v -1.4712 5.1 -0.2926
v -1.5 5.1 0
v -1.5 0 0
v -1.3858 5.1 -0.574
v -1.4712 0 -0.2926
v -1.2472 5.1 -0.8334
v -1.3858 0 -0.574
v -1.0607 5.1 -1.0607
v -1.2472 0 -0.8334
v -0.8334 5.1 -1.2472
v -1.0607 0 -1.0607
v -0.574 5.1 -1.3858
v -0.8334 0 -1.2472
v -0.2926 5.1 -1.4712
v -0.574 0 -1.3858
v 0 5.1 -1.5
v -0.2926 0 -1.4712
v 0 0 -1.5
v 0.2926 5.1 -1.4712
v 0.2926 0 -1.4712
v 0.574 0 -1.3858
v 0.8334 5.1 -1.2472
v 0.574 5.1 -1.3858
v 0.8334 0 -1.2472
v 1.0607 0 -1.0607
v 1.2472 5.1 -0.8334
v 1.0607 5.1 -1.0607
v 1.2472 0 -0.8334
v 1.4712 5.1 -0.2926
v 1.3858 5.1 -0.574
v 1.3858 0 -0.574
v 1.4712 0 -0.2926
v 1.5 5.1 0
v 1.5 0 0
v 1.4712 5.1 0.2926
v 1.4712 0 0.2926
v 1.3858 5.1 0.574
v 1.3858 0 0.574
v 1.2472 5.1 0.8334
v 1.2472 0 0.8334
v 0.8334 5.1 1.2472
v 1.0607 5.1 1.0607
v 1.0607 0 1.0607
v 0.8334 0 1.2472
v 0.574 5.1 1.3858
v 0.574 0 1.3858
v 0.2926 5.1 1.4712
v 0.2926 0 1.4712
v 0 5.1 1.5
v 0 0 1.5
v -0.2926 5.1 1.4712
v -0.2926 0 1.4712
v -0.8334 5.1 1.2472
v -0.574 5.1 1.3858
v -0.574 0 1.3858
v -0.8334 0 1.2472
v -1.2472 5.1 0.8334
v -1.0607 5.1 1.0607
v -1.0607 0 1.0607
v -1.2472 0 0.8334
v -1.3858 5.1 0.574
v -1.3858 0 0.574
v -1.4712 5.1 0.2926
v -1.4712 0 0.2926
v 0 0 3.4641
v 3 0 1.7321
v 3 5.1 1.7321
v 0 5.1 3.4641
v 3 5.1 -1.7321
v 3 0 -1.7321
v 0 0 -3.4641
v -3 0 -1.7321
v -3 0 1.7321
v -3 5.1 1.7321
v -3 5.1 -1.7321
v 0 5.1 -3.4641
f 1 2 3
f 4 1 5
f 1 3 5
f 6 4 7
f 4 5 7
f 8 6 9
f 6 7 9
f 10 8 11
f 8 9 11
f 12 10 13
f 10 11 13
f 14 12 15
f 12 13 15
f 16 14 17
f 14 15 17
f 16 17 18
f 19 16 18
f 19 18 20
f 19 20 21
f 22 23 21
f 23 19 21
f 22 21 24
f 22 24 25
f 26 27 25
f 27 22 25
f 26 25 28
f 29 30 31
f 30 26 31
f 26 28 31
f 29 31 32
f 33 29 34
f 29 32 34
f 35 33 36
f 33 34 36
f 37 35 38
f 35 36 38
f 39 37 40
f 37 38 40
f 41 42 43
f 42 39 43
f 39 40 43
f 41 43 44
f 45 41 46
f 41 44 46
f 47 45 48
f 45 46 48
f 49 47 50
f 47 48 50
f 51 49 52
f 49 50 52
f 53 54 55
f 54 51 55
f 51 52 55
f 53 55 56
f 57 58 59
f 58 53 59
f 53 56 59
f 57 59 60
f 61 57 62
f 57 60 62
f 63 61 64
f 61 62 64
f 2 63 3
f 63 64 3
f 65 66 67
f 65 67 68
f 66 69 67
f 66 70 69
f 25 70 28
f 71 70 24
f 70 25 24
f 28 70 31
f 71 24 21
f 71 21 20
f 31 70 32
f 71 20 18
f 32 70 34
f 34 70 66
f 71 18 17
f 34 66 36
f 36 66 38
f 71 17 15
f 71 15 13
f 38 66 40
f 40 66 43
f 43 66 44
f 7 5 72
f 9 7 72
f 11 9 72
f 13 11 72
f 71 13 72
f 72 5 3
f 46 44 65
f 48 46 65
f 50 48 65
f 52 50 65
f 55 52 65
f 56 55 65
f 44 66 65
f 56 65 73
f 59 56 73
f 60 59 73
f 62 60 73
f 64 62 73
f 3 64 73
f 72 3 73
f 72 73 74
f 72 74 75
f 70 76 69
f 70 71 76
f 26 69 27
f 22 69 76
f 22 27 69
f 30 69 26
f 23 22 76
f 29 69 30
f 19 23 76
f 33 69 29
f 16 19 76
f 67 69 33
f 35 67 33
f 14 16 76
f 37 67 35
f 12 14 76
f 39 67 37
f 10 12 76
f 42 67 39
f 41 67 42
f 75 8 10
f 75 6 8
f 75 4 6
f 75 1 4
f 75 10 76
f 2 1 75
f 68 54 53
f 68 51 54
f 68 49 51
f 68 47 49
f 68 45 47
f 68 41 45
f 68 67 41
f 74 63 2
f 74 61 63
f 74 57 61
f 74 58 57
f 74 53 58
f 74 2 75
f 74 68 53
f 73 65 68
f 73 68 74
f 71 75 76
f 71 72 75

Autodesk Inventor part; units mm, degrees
ref_plane "YZ Plane" through (0, 0, 0) normal (1, 0, 0) x (0, 1, 0)
ref_plane "XZ Plane" through (0, 0, 0) normal (0, 1, 0) x (-1, 0, 0)
ref_plane "XY Plane" through (0, 0, 0) normal (0, 0, 1) x (1, 0, 0)
sketch "Sketch1" plane through (0, 0, 0) normal (0, 1, 0) x (-1, 0, 0)
  line L0 (0, 3.4641) -> (3, 1.7321)
  line L1 (3, 1.7321) -> (3, -1.7321)
  line L2 (3, -1.7321) -> (0, -3.4641)
  line L3 (0, -3.4641) -> (-3, -1.7321)
  line L4 (-3, -1.7321) -> (-3, 1.7321)
  line L5 (-3, 1.7321) -> (0, 3.4641)
  circle A0 centre (0, 0) radius 1.5
  line L6 (0, -4.8497) -> (0, 4.8497) projected
  dimension "d0" = 3
  dimension "d1" = 6
extrude "Extrusion1" add sketch "Sketch1" along normal blind 5.1 contours L6 A0 L3 L4 L5 | L0 L1 L2 L6 A0
thread "Thread1" size "M3x0.5" class "6H" standard "ANSI Metric M Profile" full length
properties part number "Spacer" material "Steel, Mild"
